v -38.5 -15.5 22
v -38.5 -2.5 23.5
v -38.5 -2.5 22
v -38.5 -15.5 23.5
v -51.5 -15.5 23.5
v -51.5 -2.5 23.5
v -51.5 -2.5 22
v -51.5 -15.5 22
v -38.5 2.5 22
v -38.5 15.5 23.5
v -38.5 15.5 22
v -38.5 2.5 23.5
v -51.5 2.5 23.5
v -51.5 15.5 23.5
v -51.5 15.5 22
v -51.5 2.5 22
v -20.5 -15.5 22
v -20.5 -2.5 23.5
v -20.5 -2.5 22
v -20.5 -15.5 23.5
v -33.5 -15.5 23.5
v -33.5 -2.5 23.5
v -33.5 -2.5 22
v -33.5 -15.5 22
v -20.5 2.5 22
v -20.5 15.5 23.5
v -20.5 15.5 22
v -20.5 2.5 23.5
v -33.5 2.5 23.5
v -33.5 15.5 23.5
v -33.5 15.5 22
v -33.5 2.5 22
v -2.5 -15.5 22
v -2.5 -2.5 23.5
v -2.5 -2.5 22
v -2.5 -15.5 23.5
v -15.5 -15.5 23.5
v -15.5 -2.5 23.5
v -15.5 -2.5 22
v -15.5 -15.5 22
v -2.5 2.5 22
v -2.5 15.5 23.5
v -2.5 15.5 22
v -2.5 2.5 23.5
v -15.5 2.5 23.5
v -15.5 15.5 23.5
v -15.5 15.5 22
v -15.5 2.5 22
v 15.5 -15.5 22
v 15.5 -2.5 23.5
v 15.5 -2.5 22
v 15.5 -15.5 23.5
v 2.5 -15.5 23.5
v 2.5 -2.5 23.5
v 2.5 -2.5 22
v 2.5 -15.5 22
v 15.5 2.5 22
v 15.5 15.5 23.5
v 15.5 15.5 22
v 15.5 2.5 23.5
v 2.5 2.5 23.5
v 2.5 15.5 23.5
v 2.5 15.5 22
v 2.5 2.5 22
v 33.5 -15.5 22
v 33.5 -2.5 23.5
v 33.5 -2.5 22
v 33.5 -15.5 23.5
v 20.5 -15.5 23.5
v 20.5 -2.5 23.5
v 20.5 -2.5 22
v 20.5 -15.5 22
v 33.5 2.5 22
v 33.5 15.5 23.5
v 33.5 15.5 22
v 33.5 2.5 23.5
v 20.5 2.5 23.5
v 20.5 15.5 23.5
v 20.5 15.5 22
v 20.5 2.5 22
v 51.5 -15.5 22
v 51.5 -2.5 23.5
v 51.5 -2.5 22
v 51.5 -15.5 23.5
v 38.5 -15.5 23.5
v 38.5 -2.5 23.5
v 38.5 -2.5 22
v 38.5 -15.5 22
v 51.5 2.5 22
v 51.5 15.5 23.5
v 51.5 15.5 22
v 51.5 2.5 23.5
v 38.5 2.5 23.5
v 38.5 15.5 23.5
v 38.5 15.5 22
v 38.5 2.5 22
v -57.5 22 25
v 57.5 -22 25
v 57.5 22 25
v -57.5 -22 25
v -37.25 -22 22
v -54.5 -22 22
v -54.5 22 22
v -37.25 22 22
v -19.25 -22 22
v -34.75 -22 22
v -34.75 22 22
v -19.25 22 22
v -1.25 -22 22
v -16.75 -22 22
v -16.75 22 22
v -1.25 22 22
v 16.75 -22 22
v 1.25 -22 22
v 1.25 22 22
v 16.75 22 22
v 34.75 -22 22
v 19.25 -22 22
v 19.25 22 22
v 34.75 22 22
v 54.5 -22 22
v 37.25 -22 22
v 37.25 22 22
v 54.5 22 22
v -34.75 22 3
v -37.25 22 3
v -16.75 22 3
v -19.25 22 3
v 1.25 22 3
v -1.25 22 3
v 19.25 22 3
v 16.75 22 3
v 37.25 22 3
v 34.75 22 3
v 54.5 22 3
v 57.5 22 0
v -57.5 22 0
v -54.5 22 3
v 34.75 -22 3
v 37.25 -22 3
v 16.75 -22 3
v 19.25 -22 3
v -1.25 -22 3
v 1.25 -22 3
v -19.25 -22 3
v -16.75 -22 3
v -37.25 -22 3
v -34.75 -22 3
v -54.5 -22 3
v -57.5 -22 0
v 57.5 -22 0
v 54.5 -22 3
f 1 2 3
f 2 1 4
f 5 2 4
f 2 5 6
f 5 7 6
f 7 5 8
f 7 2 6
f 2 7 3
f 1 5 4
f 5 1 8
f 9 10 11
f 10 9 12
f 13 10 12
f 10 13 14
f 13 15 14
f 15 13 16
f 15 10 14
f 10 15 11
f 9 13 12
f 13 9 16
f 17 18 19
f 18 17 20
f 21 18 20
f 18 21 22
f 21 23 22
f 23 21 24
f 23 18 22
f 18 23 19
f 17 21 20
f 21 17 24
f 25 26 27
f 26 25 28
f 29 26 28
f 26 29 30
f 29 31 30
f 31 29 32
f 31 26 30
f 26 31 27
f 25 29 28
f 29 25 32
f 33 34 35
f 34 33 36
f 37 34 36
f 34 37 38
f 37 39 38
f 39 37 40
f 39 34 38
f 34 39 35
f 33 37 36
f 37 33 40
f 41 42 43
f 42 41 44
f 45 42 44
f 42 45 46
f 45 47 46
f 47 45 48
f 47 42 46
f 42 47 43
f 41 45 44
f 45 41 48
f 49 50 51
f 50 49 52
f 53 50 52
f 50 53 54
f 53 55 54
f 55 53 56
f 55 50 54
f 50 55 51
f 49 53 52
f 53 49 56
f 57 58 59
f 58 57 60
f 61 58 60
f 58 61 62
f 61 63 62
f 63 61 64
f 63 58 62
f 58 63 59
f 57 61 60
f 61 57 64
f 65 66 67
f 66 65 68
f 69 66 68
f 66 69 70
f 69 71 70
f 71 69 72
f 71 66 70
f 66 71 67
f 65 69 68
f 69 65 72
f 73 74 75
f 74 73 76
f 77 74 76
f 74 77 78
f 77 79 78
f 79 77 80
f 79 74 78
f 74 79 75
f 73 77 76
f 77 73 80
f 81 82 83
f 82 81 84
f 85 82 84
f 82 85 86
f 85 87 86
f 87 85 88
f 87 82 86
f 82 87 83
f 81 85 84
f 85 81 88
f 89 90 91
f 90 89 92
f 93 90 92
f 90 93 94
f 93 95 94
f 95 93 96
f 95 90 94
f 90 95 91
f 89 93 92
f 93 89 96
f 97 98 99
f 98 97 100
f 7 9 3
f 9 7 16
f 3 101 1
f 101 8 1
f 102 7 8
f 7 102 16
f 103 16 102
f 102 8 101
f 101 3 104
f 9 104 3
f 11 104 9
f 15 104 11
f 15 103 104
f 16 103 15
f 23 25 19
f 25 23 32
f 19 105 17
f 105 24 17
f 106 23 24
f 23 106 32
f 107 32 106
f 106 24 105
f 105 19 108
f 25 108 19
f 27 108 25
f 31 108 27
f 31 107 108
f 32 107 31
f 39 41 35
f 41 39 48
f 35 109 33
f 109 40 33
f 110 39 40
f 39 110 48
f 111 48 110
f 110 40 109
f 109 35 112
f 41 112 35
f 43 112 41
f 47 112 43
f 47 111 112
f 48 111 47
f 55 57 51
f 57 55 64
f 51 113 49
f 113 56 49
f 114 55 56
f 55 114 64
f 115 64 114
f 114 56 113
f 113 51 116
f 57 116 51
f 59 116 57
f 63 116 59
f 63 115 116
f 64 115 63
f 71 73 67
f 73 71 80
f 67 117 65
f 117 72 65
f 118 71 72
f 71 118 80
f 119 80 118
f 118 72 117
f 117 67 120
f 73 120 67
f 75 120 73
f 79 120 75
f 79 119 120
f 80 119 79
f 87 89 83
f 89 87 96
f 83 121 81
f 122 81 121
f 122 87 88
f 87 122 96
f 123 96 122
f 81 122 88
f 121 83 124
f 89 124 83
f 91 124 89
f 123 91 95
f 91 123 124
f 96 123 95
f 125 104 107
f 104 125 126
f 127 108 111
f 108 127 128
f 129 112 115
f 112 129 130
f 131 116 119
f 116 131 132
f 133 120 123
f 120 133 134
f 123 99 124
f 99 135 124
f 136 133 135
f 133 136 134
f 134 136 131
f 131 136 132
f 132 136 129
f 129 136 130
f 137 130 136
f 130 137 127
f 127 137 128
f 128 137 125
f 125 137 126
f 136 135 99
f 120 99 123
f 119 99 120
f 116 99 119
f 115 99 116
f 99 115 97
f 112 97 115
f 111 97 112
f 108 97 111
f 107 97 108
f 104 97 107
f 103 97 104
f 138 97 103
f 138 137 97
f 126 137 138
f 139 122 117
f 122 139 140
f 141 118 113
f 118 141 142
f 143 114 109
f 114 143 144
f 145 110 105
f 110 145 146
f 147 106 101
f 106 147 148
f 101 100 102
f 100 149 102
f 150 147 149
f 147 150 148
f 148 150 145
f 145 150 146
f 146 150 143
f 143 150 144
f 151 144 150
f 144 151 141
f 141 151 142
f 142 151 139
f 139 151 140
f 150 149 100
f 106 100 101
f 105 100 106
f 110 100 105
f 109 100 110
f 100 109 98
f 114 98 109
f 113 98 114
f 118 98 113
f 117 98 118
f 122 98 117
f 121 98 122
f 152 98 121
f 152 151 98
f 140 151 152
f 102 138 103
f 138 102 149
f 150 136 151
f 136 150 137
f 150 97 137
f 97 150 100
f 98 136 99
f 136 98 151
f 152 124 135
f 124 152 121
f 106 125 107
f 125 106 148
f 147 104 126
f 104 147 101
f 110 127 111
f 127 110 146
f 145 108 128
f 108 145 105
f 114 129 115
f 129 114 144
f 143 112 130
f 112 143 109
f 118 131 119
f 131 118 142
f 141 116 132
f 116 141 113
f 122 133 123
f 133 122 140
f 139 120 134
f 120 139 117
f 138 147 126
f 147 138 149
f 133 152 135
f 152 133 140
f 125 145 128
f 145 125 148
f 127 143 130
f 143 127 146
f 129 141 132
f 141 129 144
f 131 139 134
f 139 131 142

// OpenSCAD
// 12-cuvette rack, printed standing on its base (z = 0 to 25)
// All dimensions in mm, measured with calipers.

// Base / deck plates
base_x = 112;   // base plate length along X
base_y = 44;    // base plate depth along Y
base_t = 3;     // base plate thickness (z 0..3)
deck_t = 3;     // deck plate thickness (z 22..25)
deck_z = 22;    // bottom of deck plate

// Upright walls (full height, as deep as the plates)
wall_h = 25;    // total height of walls (z 0..25)
end_w = 3;      // thickness of the two end walls (along X)
rib_w = 2.5;    // thickness of the five internal ribs (along X)
rib_x = [-36, -18, 0, 18, 36];  // centre X positions of the five ribs

// Deck through-holes for 12.5 mm square cuvettes
hole_s = 13;    // square hole side length
pitch = 18;     // centre-to-centre spacing in both X and Y
n_rows = 2;     // rows along Y
n_cols = 6;     // columns along X

$fn = 64;

// ---- Base plate (z 0..3), centred on origin ----
module base() {
    translate([0, 0, base_t / 2])
        cube([base_x, base_y, base_t], center = true);
}

// ---- Deck plate (z 22..25), centred on origin ----
module deck() {
    translate([0, 0, deck_z + deck_t / 2])
        cube([base_x, base_y, deck_t], center = true);
}

// ---- 12 square through-holes in the deck ----
// 2 rows (Y) x 6 columns (X), 18 mm pitch, centred on the deck.
module hole_cutters() {
    for (i = [0 : n_cols - 1], j = [0 : n_rows - 1])
        translate([
            (i - (n_cols - 1) / 2) * pitch,   // X
            (j - (n_rows - 1) / 2) * pitch,   // Y
            deck_z - 1                        // extend 1 mm below deck bottom
        ])
        cube([hole_s, hole_s, deck_t + 2], center = true);
}

// ---- Seven upright walls, z 0..25, full Y depth ----
// Two 3 mm end walls flush with the short ends (x = ±56)
module end_walls() {
    translate([-base_x / 2, 0, wall_h / 2])
        cube([end_w, base_y, wall_h], center = true);
    translate([ base_x / 2, 0, wall_h / 2])
        cube([end_w, base_y, wall_h], center = true);
}

// Five 2.5 mm ribs centred at x = -36, -18, 0, 18, 36
module ribs() {
    for (x = rib_x)
        translate([x, 0, wall_h / 2])
            cube([rib_w, base_y, wall_h], center = true);
}

// ---- Assemble ----
union() {
    base();
    difference() {
        deck();
        hole_cutters();
    }
    end_walls();
    ribs();
}
